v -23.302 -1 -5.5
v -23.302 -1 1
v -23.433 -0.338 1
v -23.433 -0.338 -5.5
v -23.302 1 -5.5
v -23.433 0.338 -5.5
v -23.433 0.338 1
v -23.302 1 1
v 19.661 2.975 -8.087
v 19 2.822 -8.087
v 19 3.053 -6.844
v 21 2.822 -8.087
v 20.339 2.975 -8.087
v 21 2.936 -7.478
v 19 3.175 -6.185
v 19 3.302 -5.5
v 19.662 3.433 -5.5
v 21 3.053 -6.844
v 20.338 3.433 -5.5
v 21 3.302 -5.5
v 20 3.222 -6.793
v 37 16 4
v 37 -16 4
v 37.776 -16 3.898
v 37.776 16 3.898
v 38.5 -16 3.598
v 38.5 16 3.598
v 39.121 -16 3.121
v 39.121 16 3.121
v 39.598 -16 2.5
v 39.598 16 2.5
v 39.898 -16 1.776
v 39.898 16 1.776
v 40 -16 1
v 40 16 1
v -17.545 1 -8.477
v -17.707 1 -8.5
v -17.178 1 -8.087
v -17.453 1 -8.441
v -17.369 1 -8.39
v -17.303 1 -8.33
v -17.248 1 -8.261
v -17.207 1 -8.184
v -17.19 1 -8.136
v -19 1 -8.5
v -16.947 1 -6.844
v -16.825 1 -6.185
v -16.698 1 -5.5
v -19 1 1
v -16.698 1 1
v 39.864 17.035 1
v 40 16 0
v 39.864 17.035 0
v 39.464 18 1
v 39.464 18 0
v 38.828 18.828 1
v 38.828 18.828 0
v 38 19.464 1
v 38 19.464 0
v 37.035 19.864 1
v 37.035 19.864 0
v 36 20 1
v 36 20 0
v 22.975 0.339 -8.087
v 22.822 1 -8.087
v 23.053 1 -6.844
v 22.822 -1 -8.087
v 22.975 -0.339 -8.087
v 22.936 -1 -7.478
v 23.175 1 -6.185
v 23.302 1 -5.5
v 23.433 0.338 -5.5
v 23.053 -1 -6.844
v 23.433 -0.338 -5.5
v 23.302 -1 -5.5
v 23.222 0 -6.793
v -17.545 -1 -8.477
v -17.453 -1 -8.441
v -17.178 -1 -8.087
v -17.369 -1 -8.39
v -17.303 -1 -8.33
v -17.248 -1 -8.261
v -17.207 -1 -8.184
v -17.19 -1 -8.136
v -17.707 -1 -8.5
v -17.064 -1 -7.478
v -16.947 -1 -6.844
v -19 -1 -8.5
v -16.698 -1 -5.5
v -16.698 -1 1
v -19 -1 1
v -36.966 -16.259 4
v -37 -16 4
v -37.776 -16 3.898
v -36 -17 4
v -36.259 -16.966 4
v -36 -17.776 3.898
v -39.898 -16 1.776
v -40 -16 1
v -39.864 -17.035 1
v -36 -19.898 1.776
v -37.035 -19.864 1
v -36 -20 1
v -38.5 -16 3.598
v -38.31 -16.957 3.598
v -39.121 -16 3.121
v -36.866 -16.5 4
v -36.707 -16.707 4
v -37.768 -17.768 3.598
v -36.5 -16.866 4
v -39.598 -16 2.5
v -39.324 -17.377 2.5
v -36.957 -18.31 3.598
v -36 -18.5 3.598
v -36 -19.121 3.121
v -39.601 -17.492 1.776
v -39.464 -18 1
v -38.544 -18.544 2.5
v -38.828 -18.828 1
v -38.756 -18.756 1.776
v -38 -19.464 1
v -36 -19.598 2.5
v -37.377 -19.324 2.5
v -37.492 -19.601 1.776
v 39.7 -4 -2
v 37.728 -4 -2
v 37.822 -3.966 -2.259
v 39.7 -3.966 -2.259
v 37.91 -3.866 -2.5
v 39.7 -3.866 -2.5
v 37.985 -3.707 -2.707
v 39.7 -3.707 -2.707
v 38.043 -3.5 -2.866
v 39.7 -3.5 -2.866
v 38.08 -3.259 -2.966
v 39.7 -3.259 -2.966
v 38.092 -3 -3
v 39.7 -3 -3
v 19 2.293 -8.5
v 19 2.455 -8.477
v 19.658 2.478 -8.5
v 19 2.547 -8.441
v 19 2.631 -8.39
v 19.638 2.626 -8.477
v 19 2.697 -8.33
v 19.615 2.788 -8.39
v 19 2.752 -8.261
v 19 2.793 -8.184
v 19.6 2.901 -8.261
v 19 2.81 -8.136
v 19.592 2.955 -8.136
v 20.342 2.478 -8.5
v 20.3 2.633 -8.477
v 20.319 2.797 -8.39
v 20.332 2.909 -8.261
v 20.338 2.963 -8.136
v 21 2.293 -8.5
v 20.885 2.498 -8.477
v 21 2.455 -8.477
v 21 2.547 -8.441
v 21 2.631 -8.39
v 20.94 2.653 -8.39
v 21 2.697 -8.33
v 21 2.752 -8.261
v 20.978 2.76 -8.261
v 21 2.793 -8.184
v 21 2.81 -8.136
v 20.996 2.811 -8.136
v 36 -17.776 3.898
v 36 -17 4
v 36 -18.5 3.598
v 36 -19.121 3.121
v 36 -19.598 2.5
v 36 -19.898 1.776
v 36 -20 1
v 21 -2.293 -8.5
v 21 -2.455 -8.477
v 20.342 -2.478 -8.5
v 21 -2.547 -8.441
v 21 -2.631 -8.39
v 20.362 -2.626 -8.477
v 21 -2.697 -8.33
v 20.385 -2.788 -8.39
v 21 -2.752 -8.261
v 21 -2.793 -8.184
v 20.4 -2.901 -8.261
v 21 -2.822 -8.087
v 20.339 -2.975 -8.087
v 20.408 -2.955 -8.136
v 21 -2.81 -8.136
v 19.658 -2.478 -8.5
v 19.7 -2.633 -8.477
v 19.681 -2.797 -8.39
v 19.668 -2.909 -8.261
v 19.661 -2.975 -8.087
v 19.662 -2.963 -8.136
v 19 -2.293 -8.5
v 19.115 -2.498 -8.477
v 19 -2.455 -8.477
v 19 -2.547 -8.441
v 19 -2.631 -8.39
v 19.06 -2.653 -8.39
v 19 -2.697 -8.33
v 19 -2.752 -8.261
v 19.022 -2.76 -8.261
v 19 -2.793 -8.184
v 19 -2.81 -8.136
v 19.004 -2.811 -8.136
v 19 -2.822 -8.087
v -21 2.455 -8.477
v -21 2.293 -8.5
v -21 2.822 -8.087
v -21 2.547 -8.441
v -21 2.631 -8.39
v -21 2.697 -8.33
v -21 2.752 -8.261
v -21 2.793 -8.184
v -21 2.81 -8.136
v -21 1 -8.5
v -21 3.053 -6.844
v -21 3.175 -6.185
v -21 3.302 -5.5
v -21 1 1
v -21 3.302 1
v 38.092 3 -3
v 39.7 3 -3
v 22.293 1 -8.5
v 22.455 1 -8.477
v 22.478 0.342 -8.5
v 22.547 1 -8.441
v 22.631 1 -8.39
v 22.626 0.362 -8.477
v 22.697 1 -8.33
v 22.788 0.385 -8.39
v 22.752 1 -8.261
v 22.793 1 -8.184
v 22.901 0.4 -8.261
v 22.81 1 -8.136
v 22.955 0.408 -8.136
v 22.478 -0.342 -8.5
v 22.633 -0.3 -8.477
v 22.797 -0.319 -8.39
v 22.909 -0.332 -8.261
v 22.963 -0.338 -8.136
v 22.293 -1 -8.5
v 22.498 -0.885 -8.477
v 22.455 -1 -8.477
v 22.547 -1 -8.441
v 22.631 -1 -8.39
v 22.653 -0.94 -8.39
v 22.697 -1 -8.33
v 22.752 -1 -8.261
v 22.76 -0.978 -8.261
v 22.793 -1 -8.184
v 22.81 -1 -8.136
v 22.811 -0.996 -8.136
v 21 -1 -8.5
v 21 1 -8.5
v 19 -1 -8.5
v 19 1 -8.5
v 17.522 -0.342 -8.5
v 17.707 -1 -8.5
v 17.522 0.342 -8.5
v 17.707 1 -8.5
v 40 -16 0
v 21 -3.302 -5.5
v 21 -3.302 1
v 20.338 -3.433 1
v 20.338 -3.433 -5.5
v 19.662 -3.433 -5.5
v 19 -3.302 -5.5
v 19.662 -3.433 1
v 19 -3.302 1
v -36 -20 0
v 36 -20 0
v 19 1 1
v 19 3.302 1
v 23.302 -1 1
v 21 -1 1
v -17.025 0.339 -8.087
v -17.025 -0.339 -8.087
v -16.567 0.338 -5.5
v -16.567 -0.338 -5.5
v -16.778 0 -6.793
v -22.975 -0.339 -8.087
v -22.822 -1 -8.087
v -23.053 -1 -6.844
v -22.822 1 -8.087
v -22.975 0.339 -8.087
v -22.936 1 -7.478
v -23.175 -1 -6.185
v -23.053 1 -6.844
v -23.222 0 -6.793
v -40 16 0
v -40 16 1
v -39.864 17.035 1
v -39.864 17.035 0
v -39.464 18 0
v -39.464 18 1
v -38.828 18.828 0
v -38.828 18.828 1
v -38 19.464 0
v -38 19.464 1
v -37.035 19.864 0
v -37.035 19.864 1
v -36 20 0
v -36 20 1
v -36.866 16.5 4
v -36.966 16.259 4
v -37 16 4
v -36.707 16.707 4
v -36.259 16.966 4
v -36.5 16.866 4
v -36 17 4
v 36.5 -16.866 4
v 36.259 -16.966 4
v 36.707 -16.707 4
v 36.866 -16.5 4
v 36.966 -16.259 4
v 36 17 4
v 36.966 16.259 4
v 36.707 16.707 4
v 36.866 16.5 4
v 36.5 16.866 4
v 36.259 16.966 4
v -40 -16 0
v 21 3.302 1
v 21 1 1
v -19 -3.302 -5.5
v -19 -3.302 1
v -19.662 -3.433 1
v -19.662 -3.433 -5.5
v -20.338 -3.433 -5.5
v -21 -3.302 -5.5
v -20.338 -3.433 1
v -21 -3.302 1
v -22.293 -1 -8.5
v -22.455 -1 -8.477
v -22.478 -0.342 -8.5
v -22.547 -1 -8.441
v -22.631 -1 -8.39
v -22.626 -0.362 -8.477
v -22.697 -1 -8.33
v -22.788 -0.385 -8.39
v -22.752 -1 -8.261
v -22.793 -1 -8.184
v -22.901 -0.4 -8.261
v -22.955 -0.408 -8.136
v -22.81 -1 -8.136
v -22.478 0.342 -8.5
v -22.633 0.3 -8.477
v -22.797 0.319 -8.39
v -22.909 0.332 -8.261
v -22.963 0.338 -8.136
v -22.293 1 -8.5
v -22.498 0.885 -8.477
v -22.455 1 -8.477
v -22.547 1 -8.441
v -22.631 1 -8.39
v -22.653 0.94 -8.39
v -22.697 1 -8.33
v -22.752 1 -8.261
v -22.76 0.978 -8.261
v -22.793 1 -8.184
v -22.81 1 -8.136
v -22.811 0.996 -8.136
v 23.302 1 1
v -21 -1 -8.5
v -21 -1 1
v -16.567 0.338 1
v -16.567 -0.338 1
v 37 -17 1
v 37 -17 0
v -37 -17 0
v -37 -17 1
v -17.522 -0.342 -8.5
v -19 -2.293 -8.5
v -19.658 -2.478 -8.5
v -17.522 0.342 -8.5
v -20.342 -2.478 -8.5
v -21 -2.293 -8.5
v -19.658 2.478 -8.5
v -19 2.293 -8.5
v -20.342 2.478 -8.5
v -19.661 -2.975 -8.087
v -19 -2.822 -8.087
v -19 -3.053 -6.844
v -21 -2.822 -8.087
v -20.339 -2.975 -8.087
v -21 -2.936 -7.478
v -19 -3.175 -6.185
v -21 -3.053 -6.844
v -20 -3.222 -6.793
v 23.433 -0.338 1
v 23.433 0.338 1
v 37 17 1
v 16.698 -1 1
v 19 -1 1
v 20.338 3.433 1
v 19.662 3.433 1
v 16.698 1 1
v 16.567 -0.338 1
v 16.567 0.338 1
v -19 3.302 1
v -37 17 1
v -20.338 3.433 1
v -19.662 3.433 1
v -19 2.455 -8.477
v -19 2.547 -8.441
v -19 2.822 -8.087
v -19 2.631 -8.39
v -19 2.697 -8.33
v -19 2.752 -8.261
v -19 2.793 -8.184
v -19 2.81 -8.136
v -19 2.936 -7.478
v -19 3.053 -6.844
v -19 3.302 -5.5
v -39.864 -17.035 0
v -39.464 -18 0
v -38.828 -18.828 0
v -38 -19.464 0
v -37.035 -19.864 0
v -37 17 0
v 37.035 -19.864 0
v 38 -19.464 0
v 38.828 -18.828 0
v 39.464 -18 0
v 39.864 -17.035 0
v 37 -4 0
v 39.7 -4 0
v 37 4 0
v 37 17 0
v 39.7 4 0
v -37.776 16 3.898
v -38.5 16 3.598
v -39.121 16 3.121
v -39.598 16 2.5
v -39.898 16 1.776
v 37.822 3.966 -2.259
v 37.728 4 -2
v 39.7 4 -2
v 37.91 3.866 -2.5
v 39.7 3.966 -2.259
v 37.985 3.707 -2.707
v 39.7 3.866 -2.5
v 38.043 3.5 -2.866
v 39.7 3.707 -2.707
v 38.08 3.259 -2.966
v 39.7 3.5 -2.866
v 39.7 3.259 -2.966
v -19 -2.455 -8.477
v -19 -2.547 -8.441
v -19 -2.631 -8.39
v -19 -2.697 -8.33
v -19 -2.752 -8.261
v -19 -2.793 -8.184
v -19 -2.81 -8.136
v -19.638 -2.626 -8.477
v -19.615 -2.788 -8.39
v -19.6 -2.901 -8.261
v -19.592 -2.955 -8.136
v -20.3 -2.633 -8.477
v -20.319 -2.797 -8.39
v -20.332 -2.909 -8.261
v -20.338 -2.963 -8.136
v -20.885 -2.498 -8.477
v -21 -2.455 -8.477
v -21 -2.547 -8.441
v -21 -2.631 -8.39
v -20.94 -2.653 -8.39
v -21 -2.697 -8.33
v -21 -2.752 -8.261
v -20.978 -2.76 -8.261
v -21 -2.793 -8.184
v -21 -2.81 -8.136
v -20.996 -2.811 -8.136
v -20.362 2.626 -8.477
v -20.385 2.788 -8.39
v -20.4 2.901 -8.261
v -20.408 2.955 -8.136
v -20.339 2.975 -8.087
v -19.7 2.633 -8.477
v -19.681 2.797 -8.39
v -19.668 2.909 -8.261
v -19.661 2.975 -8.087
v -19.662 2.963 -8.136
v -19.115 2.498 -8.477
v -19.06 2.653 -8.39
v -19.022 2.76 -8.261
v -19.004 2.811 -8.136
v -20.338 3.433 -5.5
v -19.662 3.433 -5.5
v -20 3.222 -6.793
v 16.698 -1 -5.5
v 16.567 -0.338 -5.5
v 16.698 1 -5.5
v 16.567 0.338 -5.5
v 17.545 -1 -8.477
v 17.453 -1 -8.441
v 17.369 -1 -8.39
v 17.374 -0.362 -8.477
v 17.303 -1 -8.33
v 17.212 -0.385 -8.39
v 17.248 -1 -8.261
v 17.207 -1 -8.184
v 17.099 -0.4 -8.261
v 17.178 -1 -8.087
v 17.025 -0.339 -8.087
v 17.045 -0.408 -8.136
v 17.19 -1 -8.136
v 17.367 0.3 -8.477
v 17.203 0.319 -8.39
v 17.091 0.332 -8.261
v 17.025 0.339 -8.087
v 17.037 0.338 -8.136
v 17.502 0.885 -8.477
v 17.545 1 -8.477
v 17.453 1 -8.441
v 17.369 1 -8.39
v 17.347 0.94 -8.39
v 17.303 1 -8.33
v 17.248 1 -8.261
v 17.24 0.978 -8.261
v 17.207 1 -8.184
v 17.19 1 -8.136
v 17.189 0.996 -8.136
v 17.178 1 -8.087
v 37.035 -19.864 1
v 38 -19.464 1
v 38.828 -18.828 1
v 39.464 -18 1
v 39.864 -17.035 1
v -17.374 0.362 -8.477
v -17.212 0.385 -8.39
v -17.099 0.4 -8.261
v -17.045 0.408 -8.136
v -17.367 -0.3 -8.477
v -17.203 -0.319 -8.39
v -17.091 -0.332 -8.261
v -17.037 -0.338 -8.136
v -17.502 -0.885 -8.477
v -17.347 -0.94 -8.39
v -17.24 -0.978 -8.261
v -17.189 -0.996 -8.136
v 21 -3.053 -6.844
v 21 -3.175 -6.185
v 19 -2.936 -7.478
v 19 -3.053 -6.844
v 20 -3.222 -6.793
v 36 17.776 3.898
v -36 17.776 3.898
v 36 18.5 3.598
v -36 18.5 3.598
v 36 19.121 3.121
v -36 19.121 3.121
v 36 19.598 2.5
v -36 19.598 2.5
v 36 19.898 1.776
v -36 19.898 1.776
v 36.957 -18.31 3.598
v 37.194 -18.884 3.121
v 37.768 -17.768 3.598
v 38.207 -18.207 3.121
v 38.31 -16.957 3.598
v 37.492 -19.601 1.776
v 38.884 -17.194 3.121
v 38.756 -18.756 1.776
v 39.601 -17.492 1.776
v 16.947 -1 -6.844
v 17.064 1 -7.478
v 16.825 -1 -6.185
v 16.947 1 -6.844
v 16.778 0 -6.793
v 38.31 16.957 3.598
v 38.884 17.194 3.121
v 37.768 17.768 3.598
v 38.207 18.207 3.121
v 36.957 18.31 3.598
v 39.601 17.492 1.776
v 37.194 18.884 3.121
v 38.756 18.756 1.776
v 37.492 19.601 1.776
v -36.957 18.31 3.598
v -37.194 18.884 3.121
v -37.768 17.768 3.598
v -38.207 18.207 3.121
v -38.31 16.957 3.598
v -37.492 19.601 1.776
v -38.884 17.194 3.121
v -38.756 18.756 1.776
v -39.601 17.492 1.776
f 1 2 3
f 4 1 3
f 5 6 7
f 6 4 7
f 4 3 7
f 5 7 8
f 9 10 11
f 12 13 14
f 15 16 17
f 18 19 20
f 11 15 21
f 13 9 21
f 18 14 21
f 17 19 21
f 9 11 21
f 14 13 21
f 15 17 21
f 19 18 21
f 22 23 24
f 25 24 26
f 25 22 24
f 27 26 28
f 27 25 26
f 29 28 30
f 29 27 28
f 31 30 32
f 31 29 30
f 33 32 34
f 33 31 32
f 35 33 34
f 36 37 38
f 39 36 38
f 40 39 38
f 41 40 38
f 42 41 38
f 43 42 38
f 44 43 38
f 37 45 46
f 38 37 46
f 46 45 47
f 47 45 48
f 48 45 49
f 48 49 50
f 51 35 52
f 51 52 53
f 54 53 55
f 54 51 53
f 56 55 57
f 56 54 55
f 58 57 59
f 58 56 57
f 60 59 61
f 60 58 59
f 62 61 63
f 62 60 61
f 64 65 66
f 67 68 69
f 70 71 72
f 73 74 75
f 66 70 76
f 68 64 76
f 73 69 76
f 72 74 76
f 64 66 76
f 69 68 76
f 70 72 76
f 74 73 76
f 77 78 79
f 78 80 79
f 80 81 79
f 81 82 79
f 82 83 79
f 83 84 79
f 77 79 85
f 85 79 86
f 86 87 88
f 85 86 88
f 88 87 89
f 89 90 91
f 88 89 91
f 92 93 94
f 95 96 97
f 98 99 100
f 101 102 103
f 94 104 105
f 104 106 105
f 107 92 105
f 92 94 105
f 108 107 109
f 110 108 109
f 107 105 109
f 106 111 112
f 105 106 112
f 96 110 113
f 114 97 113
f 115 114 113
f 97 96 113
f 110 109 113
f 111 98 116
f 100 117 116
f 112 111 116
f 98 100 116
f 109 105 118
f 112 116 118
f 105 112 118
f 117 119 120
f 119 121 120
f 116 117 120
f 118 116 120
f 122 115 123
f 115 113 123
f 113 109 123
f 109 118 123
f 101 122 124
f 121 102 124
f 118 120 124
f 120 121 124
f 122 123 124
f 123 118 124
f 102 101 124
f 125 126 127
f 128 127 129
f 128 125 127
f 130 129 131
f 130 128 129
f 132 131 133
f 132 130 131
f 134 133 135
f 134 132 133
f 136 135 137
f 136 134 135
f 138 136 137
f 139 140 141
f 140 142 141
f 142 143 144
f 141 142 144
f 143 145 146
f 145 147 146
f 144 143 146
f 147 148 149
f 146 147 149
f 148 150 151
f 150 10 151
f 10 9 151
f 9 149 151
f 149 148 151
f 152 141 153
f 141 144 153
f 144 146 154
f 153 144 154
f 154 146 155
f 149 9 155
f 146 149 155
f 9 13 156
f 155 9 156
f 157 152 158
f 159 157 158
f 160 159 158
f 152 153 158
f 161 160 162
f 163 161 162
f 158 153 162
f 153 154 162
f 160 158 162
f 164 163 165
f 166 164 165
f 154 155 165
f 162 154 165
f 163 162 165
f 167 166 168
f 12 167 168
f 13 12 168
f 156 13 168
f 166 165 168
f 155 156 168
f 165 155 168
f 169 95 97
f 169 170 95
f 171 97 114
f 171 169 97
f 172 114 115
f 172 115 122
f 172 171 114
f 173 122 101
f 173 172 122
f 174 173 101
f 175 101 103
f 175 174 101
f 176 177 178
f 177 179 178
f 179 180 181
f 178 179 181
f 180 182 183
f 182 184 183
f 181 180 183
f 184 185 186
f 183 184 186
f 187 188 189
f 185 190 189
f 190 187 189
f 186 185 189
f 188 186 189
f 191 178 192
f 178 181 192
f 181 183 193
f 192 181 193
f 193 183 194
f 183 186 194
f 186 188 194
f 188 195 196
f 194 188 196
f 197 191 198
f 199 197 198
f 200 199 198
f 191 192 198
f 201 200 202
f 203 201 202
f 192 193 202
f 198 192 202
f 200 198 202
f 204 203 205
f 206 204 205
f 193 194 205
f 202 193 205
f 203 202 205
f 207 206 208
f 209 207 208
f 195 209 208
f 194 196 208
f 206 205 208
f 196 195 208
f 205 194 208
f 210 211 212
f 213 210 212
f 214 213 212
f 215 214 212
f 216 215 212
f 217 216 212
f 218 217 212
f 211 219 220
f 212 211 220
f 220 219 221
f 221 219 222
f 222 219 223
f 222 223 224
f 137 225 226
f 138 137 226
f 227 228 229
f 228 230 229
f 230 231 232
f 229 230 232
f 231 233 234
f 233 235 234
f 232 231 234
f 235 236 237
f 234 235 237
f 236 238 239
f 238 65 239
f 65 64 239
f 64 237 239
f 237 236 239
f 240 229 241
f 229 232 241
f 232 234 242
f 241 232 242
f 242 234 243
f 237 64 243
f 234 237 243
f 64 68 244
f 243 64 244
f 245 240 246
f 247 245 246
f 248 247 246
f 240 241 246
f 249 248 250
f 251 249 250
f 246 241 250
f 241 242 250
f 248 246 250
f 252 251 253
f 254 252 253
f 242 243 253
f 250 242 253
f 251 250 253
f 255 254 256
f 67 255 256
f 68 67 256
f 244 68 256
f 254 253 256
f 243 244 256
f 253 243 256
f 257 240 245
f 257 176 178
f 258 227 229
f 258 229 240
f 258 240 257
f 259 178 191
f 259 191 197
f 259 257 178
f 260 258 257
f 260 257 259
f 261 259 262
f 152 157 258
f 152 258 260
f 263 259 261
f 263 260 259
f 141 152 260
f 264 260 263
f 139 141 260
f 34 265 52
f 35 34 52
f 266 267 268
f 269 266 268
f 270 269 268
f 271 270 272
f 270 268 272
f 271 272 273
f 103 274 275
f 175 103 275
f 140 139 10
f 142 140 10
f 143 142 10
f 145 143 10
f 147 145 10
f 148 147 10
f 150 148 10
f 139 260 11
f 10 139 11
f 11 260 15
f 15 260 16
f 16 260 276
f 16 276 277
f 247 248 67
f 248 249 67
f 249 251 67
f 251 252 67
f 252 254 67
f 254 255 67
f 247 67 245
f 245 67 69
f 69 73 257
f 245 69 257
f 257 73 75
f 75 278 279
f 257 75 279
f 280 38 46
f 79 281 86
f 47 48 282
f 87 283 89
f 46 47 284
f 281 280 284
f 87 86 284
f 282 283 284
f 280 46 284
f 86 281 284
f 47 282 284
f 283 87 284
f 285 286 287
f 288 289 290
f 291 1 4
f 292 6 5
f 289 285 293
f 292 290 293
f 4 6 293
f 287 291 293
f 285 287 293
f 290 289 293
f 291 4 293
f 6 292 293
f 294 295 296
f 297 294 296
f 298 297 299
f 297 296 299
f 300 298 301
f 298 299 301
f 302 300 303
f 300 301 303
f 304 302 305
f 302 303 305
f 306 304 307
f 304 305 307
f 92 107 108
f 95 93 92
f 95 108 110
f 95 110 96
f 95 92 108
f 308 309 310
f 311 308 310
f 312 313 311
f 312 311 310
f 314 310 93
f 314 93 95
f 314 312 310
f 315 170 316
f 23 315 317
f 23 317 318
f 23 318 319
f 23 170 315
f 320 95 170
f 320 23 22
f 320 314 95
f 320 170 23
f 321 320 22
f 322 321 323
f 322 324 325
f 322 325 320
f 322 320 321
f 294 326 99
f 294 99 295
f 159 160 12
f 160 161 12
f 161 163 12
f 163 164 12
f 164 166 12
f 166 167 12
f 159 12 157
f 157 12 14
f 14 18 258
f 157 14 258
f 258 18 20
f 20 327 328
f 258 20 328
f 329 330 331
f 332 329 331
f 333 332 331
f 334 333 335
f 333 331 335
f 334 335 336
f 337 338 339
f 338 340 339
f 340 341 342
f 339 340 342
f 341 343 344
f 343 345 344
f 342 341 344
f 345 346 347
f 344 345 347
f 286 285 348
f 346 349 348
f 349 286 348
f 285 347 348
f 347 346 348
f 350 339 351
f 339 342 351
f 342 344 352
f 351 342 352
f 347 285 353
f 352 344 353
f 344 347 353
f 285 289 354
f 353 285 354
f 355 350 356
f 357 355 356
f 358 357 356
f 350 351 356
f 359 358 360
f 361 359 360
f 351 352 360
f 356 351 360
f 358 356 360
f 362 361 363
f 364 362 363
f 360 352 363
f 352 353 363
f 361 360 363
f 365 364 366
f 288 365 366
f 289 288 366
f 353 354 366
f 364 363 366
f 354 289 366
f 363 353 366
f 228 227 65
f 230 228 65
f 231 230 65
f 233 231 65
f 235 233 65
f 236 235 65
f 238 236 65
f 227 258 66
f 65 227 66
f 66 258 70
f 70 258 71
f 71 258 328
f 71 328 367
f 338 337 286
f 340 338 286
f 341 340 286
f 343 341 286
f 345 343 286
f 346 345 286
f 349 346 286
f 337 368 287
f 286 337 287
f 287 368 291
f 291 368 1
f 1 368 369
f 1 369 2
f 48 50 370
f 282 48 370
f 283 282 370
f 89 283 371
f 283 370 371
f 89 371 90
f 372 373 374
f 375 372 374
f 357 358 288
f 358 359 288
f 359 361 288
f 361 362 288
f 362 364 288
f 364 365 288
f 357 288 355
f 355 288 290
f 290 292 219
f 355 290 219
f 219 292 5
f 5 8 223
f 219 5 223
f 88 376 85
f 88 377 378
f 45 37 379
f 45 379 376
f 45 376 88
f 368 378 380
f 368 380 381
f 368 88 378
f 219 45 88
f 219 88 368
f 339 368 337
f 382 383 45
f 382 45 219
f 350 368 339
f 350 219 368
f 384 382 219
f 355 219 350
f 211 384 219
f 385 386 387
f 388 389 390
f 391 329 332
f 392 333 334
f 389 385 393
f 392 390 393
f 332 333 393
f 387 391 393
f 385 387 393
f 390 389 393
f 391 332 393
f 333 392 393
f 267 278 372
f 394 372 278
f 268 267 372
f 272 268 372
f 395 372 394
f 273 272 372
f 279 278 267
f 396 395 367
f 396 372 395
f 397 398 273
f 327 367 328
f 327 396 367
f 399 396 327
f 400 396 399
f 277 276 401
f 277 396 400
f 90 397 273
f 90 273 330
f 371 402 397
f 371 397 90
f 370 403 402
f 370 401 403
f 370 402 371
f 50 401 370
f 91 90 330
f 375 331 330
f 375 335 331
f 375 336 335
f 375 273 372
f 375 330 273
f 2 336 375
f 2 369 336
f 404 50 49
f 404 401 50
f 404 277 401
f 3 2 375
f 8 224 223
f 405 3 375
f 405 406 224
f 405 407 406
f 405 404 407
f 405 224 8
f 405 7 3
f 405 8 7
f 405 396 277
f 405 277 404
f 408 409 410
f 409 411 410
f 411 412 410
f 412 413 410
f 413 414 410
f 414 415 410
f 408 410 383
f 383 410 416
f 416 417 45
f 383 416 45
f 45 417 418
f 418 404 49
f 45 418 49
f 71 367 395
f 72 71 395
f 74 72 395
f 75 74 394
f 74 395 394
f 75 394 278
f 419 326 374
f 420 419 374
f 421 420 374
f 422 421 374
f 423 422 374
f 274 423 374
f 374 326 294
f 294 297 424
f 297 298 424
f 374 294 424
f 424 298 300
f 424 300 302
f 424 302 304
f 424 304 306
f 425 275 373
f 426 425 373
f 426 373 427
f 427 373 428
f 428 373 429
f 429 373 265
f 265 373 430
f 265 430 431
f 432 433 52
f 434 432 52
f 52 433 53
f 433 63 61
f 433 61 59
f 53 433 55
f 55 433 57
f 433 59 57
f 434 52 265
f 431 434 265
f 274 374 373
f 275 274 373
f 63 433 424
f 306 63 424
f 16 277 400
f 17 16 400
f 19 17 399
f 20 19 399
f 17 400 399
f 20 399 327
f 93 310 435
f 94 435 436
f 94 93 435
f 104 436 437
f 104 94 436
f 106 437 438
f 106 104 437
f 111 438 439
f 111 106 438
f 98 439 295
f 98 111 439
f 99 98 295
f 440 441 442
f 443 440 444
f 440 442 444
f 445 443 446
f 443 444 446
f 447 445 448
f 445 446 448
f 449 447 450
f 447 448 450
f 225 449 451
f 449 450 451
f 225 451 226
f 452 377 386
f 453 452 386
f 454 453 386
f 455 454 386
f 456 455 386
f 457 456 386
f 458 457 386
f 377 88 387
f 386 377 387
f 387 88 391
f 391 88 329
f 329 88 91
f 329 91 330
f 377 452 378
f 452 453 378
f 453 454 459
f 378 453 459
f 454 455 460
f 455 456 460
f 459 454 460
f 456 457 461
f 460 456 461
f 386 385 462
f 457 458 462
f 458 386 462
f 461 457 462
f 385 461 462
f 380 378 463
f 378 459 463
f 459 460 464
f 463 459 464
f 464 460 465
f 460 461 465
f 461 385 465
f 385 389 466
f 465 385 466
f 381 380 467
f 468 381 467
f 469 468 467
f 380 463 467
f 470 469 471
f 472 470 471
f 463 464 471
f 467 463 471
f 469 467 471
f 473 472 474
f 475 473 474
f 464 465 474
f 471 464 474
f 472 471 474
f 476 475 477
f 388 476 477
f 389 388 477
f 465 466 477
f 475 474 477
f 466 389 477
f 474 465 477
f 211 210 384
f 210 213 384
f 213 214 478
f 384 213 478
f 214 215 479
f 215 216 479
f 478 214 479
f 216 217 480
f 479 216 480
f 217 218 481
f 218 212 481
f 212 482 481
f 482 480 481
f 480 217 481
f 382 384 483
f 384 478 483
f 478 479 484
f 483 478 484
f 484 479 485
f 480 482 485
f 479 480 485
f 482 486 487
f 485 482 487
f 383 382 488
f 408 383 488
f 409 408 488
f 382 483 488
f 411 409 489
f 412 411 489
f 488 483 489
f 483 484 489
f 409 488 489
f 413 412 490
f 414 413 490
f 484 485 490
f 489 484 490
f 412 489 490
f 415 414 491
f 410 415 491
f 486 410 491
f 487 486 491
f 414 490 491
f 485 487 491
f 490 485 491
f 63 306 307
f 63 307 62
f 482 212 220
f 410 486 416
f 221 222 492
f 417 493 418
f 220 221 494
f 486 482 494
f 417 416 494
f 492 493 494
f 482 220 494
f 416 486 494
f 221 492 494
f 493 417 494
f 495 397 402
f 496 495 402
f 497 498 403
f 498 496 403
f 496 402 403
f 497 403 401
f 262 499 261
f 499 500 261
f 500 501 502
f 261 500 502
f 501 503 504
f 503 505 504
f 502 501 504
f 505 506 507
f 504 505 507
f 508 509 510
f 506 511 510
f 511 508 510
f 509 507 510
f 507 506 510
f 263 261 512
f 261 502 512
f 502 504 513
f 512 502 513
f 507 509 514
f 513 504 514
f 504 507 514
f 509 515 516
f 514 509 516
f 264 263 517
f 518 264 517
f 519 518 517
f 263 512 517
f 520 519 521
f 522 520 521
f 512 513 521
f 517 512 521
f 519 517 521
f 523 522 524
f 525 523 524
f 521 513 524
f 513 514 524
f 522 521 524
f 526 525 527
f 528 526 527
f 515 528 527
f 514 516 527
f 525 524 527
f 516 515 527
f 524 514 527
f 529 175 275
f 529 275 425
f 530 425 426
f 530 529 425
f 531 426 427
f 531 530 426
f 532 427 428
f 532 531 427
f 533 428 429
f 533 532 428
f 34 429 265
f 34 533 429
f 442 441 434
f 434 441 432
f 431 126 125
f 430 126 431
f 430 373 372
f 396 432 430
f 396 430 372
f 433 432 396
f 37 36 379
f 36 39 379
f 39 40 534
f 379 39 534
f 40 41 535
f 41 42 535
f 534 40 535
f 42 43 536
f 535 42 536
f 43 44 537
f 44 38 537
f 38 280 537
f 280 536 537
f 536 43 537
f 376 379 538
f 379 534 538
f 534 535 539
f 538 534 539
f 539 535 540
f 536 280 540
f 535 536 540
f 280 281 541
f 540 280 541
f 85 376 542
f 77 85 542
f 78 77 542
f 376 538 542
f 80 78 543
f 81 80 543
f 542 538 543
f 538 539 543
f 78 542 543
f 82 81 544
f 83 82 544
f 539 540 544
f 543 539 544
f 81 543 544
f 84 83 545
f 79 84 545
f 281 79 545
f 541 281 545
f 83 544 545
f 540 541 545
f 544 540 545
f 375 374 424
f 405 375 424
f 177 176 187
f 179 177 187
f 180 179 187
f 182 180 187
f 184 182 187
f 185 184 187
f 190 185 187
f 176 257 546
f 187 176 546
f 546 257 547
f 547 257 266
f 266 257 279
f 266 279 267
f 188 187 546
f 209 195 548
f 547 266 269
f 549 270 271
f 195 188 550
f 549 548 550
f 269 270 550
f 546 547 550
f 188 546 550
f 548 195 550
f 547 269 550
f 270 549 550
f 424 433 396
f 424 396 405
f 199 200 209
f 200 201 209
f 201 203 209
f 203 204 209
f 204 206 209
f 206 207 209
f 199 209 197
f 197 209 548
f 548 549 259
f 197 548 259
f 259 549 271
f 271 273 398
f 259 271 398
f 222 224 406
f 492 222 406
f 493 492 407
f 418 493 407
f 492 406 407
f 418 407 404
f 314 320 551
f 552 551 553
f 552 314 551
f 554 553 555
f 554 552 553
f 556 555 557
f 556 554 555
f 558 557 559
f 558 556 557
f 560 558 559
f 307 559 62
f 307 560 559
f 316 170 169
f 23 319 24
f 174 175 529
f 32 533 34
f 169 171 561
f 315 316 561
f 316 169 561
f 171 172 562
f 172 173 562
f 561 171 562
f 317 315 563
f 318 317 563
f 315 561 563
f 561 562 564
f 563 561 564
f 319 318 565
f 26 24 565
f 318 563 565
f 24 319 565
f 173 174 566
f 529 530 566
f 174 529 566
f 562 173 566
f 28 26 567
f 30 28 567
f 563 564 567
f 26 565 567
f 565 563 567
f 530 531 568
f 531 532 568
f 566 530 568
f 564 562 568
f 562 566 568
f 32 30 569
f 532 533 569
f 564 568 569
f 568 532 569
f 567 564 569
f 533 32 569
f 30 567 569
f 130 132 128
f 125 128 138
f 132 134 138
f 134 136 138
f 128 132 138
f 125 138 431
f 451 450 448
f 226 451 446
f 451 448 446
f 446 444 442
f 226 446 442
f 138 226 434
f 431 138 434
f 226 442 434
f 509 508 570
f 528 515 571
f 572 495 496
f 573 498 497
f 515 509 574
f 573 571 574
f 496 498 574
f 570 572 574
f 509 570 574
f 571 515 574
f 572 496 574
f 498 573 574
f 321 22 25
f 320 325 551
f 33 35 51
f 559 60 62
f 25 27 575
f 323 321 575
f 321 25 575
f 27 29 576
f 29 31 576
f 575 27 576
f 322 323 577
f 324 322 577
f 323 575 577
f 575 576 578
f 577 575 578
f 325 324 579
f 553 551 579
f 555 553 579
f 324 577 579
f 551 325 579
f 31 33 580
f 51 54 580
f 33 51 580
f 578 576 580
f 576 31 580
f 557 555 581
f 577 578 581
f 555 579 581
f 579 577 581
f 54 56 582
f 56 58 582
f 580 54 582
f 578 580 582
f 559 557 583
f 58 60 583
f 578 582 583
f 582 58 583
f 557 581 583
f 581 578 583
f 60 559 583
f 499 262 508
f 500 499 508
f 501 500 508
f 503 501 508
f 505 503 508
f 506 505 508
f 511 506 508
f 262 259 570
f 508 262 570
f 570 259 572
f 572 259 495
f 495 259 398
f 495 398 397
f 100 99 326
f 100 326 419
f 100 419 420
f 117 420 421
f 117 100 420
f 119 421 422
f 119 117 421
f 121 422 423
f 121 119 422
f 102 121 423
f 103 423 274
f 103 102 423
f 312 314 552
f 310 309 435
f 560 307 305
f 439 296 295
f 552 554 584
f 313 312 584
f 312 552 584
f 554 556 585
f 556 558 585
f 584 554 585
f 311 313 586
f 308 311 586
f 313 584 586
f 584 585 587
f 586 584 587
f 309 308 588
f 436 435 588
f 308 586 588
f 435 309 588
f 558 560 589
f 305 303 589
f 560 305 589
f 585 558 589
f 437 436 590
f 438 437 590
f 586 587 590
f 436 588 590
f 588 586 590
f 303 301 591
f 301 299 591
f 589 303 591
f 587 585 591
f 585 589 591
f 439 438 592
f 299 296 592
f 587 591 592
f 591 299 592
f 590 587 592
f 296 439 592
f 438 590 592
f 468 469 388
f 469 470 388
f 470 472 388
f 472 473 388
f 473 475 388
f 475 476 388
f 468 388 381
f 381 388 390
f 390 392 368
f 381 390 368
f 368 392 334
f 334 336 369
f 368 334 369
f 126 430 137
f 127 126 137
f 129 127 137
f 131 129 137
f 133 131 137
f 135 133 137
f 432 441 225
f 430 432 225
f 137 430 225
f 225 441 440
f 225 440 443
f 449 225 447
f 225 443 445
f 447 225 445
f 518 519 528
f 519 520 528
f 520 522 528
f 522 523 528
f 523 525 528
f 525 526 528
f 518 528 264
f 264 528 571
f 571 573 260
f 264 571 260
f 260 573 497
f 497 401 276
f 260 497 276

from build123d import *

# Parameters (mm, degrees)
SKETCH1_W           = 80
SKETCH1_H           = 40
BOSS_EXTRUDE1_DEPTH = 4
FILLET1_R           = 4
FILLET2_R           = 3
SKETCH2_W           = 74
SKETCH2_H           = 34
CUT_EXTRUDE1_DEPTH  = 1
BOSS_EXTRUDE2_DEPTH = 4
FILLET3_R           = 1
BOSS_EXTRUDE3_DEPTH = 9.5
LPATTERN1_COUNT     = 2
LPATTERN1_PITCH     = 40


with BuildPart() as part:
    # Sketch1 → Boss-Extrude1 (new body)
    with BuildSketch(Plane.XY):
        Rectangle(SKETCH1_W, SKETCH1_H)
    extrude(amount=BOSS_EXTRUDE1_DEPTH)

    # Fillet1
    fillet1_edges = [part.edges().sort_by_distance(p)[0] for p in [
        (-40, 20, 2),
        (40, 20, 2),
        (40, -20, 2),
        (-40, -20, 2),
    ]]
    fillet(fillet1_edges, radius=FILLET1_R)

    # Fillet2
    fillet2_edges = [part.edges().sort_by_distance(p)[0] for p in [
        (0, -20, 4),
        (-40, 0, 4),
        (40, 0, 4),
        (0, 20, 4),
        (-38.828427125, 18.828427125, 4),
        (38.828427125, 18.828427125, 4),
        (38.828427125, -18.828427125, 4),
        (-38.828427125, -18.828427125, 4),
    ]]
    fillet(fillet2_edges, radius=FILLET2_R)

    # Sketch2 → Cut-Extrude1 (cut)
    with BuildSketch(Plane(origin=(0, 0, 0), x_dir=(-1, 0, 0), z_dir=(0, 0, -1))):
        Rectangle(SKETCH2_W, SKETCH2_H)
    extrude(amount=-CUT_EXTRUDE1_DEPTH, mode=Mode.SUBTRACT)

    # Sketch3 → Boss-Extrude2 (add, symmetric)
    with BuildSketch(Plane(origin=(0, 0, 0), x_dir=(0, 0, -1), z_dir=(0, 1, 0))):
        Polygon((0, -37), (3, -38.091910703), (3, -39.7), (0, -39.7), align=None)
    extrude(amount=BOSS_EXTRUDE2_DEPTH, both=True)

    # Fillet3
    fillet3_edges = [part.edges().sort_by_distance(p)[0] for p in [
        (38.895955351, -4, -3),
        (38.895955351, 4, -3),
    ]]
    fillet(fillet3_edges, radius=FILLET3_R)

    # Sketch4 → Boss-Extrude3 (add)
    with BuildSketch(Plane(origin=(0, 0, 1), x_dir=(-1, 0, 0), z_dir=(0, 0, -1))):
        with BuildLine():
            Line((-23.301893396, -1), (-21, -1))
            Line((-21, -1), (-21, -3.301893396))
            ThreePointArc((-21, -3.301893396), (-20, -3.45), (-19, -3.301893396))
            Line((-19, -3.301893396), (-19, -1))
            Line((-19, -1), (-16.698106604, -1))
            ThreePointArc((-16.698106604, -1), (-16.55, 0), (-16.698106604, 1))
            Line((-16.698106604, 1), (-19, 1))
            Line((-19, 1), (-19, 3.301893396))
            ThreePointArc((-19, 3.301893396), (-20, 3.45), (-21, 3.301893396))
            Line((-21, 3.301893396), (-21, 1))
            Line((-21, 1), (-23.301893396, 1))
            ThreePointArc((-23.301893396, 1), (-23.45, 0), (-23.301893396, -1))
        make_face()
    boss_extrude3 = extrude(amount=BOSS_EXTRUDE3_DEPTH)

    # Sketch5 → Cut-Revolve1 (revolve, cut)
    with BuildSketch(Plane(origin=(0, 0, 0), x_dir=(0, 0, -1), z_dir=(0, 1, 0))):
        with BuildLine():
            Line((5.5, -16.55), (8.5, -16.55))
            Line((8.5, -16.55), (8.5, -17.498530758))
            ThreePointArc((8.5, -17.498530758), (8.383022222, -17.177136953), (8.086824089, -17.006126881))
            Line((8.086824089, -17.006126881), (5.5, -16.55))
        make_face()
    cut_revolve1 = revolve(axis=Axis((20, 0, 1), (0, 0, -1)), mode=Mode.SUBTRACT)

    # LPattern1: Boss-Extrude3, Cut-Revolve1 ×2
    with Locations(*[(-i * LPATTERN1_PITCH, 0, 0) for i in range(1, LPATTERN1_COUNT)]):
        add(boss_extrude3)
        add(cut_revolve1, mode=Mode.SUBTRACT)


solid = part.part
